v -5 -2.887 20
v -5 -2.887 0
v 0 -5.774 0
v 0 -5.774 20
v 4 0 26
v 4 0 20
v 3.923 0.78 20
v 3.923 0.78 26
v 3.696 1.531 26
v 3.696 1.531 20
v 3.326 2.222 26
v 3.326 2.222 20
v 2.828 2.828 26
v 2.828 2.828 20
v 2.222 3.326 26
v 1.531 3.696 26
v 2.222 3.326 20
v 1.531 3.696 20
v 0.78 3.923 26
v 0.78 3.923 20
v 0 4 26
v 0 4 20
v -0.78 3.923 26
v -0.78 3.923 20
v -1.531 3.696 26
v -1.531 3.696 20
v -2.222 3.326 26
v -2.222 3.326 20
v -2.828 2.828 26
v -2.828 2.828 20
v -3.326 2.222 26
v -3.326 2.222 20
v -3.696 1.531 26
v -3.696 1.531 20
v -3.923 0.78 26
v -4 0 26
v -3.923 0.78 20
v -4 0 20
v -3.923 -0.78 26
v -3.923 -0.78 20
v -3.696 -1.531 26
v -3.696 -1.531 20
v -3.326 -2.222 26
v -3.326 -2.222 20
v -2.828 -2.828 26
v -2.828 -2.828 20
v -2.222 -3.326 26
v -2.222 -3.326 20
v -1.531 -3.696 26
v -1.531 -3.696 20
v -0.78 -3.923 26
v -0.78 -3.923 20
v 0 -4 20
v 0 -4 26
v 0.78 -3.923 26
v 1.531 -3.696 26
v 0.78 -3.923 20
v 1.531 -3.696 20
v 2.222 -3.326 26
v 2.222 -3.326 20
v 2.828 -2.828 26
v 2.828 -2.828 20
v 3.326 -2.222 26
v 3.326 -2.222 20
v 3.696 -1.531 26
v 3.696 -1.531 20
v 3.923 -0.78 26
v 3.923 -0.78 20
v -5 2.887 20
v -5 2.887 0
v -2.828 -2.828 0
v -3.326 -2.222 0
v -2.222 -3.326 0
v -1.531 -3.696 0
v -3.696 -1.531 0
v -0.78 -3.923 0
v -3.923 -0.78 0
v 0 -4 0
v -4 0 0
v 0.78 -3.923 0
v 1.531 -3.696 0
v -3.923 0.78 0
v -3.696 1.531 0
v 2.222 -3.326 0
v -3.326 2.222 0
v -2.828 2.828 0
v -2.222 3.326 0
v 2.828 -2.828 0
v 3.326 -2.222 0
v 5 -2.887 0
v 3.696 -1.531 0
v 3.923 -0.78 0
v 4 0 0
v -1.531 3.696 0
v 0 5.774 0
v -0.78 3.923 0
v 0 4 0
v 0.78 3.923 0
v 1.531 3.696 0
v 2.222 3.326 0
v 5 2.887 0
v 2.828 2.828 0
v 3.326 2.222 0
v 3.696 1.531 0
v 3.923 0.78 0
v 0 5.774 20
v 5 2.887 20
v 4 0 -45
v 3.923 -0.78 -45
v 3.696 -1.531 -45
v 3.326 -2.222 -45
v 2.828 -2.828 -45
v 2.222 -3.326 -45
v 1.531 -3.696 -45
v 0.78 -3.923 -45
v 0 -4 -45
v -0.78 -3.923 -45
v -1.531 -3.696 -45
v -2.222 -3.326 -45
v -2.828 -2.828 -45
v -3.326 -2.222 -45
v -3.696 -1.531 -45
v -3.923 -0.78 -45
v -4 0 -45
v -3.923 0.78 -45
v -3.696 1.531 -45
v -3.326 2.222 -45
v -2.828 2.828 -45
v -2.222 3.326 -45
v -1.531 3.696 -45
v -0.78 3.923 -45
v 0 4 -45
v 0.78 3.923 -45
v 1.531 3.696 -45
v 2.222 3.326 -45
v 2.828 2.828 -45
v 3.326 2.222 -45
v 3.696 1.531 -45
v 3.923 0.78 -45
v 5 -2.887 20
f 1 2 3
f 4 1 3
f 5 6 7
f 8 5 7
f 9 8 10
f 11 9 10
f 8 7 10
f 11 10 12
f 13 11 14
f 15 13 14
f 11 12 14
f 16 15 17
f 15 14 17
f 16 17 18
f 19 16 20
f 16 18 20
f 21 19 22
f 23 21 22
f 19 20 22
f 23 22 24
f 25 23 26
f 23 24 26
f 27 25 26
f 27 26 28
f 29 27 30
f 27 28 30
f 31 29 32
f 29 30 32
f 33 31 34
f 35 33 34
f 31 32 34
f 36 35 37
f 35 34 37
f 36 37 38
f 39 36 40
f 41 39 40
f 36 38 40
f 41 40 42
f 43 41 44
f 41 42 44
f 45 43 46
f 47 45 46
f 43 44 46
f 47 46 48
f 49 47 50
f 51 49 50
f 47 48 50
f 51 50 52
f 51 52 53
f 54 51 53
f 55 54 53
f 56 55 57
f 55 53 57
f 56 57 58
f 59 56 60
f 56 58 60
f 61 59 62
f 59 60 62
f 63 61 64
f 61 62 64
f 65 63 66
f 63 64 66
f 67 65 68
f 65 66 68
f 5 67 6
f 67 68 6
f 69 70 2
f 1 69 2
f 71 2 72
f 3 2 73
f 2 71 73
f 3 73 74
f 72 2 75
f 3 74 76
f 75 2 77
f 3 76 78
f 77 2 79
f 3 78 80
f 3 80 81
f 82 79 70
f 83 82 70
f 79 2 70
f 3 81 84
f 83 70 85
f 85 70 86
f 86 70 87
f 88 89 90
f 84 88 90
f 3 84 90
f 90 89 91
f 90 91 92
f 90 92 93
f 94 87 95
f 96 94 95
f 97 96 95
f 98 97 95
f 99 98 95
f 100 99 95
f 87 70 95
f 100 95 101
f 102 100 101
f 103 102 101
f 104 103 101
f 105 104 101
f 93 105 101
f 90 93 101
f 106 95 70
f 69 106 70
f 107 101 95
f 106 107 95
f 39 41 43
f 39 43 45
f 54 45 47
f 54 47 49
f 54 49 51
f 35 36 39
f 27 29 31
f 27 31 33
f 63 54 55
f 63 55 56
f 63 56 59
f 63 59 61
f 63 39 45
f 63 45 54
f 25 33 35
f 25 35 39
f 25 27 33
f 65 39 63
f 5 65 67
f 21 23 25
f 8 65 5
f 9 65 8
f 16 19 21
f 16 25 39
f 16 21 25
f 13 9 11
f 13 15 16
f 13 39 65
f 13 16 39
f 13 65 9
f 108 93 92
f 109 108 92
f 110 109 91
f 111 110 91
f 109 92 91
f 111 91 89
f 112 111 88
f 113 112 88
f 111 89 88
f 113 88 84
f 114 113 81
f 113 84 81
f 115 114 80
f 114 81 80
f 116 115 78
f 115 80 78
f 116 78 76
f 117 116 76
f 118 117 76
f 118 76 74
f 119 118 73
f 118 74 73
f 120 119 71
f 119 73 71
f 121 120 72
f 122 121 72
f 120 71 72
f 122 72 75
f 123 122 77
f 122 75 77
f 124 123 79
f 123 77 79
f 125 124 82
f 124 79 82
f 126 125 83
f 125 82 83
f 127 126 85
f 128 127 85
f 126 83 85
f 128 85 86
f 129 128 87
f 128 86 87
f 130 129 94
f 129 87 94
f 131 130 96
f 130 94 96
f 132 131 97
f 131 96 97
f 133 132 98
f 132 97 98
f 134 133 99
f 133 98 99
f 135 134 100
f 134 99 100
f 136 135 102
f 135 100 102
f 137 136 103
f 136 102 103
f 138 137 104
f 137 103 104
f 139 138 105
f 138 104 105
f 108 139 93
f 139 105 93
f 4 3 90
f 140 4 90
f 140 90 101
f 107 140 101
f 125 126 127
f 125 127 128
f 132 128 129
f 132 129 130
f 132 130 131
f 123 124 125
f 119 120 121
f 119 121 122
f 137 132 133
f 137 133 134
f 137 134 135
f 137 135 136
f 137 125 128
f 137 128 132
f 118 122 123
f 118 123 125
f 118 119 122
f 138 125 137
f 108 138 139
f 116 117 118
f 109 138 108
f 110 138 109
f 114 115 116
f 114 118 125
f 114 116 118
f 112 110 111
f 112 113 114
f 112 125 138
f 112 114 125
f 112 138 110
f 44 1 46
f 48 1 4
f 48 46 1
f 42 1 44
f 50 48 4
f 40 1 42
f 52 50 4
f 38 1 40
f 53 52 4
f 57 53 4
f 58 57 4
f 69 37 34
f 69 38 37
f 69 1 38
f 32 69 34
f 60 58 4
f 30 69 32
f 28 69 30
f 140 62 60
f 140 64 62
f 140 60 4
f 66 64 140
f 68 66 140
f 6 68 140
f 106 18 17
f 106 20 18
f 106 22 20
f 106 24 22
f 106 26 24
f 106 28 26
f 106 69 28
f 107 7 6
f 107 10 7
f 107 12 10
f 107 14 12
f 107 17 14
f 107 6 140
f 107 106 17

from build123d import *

# Parameters (mm, degrees)
F1_DEPTH = 20
F2_R     = 4
F3_DEPTH = 45
F4_R     = 4
F5_DEPTH = 6


with BuildPart() as f1:
    # F0 (on Top) → F1 (new body)
    with BuildSketch(Plane.XY):
        Polygon((5, 2.8867513459), (0, 5.7735026919), (-5, 2.8867513459), (-5, -2.8867513459), (0, -5.7735026919), (5, -2.8867513459), align=None)
    extrude(amount=F1_DEPTH)

    # F2 (on face) → F3 (join)
    with BuildSketch(Plane(origin=(0, 0, 0), x_dir=(1, 0, 0), z_dir=(0, 0, -1))):
        Circle(F2_R)
    extrude(amount=F3_DEPTH)

    # F4 (on face) → F5 (join)
    with BuildSketch(Plane.XY.offset(20)):
        Circle(F4_R)
    extrude(amount=F5_DEPTH)


solid = f1.part
